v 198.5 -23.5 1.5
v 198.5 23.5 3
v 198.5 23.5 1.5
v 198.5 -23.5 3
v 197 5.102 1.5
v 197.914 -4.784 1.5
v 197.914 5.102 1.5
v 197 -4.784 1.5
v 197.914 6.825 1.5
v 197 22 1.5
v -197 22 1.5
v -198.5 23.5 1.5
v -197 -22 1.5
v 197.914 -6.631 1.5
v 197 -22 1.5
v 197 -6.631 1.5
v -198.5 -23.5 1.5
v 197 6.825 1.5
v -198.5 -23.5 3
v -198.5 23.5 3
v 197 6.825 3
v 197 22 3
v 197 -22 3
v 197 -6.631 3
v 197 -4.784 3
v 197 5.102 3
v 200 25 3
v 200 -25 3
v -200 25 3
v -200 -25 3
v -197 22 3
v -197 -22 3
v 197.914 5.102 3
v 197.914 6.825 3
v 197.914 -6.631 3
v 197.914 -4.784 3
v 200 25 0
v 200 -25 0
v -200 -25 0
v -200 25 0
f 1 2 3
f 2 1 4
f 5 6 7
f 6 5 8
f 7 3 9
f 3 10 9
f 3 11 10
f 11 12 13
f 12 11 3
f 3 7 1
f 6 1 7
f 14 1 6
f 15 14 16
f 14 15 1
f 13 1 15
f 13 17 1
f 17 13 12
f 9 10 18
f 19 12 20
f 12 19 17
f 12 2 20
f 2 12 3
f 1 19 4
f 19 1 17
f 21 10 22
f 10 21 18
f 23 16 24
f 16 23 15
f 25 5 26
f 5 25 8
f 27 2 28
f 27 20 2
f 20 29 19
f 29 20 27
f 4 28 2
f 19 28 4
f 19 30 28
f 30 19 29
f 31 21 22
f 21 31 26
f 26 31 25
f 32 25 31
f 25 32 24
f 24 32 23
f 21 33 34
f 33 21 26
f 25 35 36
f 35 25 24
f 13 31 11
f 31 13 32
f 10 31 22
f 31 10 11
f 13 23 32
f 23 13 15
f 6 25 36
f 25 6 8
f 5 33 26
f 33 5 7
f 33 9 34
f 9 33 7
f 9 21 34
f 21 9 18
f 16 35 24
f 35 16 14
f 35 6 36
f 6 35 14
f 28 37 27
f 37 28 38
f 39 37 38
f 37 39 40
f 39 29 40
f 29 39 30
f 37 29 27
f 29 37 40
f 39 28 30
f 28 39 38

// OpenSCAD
DEFAULT_FONT = "Roboto";
//DEFAULT_FONT = "Helvetica";

DEFAULT_QUOTE_SHEEET_SIZE = [400, 50, 3];

module centeredText(text, area, resizeTextHeight, font)
{
    length = area[0];
    height = area[1];
    depth  = area[2];

    translate([(length / -2), 0, (depth / -2)])
    linear_extrude(depth)
    resize([length, resizeTextHeight ? height : 0], auto = true)
    text(text, font=font, valign = "center");
}

module QuotePanel(
    quoteText,
    sourceText,
    boxSize = DEFAULT_QUOTE_SHEEET_SIZE, 
    resizeTextHeight=false,
    font=DEFAULT_FONT)
{
    MARGIN_WIDTH = boxSize[2] / 2;

    MARGIN_DEPTH = boxSize[2] / 2;
    TEXT_DEPTH = boxSize[2] / 2;

    translate([0, 0, boxSize[2] / 2])
    difference()
    {
        // Main shape
        cube(boxSize, center=true);

        // Margins
        difference()
        {
            translate([0, 0, boxSize[2] - MARGIN_DEPTH])
            cube(boxSize - [MARGIN_WIDTH*2, MARGIN_WIDTH*2, 0], center=true);

            cube(boxSize - [MARGIN_WIDTH*4, MARGIN_WIDTH*4, 0], center=true);

            // Quote text
            quoteTextArea = boxSize - [MARGIN_WIDTH*6, MARGIN_WIDTH*6, 0];
            translate([0, 0,  boxSize[2] - TEXT_DEPTH])
            centeredText(quoteText, quoteTextArea, resizeTextHeight, font);

            // Source text
            //sourceTextArea = [boxSize[0]/10,  boxSize[1]/10, boxSize[2]];
            //color("red")
            //translate([boxSize[0] * 0.425, boxSize[1] * -0.3,  boxSize[2] - TEXT_DEPTH])
            //centeredText(sourceText, sourceTextArea, resizeTextHeight, font);
        }
    }
}

QuotePanel("If you want the toilet, you're in it", " - TISM");
